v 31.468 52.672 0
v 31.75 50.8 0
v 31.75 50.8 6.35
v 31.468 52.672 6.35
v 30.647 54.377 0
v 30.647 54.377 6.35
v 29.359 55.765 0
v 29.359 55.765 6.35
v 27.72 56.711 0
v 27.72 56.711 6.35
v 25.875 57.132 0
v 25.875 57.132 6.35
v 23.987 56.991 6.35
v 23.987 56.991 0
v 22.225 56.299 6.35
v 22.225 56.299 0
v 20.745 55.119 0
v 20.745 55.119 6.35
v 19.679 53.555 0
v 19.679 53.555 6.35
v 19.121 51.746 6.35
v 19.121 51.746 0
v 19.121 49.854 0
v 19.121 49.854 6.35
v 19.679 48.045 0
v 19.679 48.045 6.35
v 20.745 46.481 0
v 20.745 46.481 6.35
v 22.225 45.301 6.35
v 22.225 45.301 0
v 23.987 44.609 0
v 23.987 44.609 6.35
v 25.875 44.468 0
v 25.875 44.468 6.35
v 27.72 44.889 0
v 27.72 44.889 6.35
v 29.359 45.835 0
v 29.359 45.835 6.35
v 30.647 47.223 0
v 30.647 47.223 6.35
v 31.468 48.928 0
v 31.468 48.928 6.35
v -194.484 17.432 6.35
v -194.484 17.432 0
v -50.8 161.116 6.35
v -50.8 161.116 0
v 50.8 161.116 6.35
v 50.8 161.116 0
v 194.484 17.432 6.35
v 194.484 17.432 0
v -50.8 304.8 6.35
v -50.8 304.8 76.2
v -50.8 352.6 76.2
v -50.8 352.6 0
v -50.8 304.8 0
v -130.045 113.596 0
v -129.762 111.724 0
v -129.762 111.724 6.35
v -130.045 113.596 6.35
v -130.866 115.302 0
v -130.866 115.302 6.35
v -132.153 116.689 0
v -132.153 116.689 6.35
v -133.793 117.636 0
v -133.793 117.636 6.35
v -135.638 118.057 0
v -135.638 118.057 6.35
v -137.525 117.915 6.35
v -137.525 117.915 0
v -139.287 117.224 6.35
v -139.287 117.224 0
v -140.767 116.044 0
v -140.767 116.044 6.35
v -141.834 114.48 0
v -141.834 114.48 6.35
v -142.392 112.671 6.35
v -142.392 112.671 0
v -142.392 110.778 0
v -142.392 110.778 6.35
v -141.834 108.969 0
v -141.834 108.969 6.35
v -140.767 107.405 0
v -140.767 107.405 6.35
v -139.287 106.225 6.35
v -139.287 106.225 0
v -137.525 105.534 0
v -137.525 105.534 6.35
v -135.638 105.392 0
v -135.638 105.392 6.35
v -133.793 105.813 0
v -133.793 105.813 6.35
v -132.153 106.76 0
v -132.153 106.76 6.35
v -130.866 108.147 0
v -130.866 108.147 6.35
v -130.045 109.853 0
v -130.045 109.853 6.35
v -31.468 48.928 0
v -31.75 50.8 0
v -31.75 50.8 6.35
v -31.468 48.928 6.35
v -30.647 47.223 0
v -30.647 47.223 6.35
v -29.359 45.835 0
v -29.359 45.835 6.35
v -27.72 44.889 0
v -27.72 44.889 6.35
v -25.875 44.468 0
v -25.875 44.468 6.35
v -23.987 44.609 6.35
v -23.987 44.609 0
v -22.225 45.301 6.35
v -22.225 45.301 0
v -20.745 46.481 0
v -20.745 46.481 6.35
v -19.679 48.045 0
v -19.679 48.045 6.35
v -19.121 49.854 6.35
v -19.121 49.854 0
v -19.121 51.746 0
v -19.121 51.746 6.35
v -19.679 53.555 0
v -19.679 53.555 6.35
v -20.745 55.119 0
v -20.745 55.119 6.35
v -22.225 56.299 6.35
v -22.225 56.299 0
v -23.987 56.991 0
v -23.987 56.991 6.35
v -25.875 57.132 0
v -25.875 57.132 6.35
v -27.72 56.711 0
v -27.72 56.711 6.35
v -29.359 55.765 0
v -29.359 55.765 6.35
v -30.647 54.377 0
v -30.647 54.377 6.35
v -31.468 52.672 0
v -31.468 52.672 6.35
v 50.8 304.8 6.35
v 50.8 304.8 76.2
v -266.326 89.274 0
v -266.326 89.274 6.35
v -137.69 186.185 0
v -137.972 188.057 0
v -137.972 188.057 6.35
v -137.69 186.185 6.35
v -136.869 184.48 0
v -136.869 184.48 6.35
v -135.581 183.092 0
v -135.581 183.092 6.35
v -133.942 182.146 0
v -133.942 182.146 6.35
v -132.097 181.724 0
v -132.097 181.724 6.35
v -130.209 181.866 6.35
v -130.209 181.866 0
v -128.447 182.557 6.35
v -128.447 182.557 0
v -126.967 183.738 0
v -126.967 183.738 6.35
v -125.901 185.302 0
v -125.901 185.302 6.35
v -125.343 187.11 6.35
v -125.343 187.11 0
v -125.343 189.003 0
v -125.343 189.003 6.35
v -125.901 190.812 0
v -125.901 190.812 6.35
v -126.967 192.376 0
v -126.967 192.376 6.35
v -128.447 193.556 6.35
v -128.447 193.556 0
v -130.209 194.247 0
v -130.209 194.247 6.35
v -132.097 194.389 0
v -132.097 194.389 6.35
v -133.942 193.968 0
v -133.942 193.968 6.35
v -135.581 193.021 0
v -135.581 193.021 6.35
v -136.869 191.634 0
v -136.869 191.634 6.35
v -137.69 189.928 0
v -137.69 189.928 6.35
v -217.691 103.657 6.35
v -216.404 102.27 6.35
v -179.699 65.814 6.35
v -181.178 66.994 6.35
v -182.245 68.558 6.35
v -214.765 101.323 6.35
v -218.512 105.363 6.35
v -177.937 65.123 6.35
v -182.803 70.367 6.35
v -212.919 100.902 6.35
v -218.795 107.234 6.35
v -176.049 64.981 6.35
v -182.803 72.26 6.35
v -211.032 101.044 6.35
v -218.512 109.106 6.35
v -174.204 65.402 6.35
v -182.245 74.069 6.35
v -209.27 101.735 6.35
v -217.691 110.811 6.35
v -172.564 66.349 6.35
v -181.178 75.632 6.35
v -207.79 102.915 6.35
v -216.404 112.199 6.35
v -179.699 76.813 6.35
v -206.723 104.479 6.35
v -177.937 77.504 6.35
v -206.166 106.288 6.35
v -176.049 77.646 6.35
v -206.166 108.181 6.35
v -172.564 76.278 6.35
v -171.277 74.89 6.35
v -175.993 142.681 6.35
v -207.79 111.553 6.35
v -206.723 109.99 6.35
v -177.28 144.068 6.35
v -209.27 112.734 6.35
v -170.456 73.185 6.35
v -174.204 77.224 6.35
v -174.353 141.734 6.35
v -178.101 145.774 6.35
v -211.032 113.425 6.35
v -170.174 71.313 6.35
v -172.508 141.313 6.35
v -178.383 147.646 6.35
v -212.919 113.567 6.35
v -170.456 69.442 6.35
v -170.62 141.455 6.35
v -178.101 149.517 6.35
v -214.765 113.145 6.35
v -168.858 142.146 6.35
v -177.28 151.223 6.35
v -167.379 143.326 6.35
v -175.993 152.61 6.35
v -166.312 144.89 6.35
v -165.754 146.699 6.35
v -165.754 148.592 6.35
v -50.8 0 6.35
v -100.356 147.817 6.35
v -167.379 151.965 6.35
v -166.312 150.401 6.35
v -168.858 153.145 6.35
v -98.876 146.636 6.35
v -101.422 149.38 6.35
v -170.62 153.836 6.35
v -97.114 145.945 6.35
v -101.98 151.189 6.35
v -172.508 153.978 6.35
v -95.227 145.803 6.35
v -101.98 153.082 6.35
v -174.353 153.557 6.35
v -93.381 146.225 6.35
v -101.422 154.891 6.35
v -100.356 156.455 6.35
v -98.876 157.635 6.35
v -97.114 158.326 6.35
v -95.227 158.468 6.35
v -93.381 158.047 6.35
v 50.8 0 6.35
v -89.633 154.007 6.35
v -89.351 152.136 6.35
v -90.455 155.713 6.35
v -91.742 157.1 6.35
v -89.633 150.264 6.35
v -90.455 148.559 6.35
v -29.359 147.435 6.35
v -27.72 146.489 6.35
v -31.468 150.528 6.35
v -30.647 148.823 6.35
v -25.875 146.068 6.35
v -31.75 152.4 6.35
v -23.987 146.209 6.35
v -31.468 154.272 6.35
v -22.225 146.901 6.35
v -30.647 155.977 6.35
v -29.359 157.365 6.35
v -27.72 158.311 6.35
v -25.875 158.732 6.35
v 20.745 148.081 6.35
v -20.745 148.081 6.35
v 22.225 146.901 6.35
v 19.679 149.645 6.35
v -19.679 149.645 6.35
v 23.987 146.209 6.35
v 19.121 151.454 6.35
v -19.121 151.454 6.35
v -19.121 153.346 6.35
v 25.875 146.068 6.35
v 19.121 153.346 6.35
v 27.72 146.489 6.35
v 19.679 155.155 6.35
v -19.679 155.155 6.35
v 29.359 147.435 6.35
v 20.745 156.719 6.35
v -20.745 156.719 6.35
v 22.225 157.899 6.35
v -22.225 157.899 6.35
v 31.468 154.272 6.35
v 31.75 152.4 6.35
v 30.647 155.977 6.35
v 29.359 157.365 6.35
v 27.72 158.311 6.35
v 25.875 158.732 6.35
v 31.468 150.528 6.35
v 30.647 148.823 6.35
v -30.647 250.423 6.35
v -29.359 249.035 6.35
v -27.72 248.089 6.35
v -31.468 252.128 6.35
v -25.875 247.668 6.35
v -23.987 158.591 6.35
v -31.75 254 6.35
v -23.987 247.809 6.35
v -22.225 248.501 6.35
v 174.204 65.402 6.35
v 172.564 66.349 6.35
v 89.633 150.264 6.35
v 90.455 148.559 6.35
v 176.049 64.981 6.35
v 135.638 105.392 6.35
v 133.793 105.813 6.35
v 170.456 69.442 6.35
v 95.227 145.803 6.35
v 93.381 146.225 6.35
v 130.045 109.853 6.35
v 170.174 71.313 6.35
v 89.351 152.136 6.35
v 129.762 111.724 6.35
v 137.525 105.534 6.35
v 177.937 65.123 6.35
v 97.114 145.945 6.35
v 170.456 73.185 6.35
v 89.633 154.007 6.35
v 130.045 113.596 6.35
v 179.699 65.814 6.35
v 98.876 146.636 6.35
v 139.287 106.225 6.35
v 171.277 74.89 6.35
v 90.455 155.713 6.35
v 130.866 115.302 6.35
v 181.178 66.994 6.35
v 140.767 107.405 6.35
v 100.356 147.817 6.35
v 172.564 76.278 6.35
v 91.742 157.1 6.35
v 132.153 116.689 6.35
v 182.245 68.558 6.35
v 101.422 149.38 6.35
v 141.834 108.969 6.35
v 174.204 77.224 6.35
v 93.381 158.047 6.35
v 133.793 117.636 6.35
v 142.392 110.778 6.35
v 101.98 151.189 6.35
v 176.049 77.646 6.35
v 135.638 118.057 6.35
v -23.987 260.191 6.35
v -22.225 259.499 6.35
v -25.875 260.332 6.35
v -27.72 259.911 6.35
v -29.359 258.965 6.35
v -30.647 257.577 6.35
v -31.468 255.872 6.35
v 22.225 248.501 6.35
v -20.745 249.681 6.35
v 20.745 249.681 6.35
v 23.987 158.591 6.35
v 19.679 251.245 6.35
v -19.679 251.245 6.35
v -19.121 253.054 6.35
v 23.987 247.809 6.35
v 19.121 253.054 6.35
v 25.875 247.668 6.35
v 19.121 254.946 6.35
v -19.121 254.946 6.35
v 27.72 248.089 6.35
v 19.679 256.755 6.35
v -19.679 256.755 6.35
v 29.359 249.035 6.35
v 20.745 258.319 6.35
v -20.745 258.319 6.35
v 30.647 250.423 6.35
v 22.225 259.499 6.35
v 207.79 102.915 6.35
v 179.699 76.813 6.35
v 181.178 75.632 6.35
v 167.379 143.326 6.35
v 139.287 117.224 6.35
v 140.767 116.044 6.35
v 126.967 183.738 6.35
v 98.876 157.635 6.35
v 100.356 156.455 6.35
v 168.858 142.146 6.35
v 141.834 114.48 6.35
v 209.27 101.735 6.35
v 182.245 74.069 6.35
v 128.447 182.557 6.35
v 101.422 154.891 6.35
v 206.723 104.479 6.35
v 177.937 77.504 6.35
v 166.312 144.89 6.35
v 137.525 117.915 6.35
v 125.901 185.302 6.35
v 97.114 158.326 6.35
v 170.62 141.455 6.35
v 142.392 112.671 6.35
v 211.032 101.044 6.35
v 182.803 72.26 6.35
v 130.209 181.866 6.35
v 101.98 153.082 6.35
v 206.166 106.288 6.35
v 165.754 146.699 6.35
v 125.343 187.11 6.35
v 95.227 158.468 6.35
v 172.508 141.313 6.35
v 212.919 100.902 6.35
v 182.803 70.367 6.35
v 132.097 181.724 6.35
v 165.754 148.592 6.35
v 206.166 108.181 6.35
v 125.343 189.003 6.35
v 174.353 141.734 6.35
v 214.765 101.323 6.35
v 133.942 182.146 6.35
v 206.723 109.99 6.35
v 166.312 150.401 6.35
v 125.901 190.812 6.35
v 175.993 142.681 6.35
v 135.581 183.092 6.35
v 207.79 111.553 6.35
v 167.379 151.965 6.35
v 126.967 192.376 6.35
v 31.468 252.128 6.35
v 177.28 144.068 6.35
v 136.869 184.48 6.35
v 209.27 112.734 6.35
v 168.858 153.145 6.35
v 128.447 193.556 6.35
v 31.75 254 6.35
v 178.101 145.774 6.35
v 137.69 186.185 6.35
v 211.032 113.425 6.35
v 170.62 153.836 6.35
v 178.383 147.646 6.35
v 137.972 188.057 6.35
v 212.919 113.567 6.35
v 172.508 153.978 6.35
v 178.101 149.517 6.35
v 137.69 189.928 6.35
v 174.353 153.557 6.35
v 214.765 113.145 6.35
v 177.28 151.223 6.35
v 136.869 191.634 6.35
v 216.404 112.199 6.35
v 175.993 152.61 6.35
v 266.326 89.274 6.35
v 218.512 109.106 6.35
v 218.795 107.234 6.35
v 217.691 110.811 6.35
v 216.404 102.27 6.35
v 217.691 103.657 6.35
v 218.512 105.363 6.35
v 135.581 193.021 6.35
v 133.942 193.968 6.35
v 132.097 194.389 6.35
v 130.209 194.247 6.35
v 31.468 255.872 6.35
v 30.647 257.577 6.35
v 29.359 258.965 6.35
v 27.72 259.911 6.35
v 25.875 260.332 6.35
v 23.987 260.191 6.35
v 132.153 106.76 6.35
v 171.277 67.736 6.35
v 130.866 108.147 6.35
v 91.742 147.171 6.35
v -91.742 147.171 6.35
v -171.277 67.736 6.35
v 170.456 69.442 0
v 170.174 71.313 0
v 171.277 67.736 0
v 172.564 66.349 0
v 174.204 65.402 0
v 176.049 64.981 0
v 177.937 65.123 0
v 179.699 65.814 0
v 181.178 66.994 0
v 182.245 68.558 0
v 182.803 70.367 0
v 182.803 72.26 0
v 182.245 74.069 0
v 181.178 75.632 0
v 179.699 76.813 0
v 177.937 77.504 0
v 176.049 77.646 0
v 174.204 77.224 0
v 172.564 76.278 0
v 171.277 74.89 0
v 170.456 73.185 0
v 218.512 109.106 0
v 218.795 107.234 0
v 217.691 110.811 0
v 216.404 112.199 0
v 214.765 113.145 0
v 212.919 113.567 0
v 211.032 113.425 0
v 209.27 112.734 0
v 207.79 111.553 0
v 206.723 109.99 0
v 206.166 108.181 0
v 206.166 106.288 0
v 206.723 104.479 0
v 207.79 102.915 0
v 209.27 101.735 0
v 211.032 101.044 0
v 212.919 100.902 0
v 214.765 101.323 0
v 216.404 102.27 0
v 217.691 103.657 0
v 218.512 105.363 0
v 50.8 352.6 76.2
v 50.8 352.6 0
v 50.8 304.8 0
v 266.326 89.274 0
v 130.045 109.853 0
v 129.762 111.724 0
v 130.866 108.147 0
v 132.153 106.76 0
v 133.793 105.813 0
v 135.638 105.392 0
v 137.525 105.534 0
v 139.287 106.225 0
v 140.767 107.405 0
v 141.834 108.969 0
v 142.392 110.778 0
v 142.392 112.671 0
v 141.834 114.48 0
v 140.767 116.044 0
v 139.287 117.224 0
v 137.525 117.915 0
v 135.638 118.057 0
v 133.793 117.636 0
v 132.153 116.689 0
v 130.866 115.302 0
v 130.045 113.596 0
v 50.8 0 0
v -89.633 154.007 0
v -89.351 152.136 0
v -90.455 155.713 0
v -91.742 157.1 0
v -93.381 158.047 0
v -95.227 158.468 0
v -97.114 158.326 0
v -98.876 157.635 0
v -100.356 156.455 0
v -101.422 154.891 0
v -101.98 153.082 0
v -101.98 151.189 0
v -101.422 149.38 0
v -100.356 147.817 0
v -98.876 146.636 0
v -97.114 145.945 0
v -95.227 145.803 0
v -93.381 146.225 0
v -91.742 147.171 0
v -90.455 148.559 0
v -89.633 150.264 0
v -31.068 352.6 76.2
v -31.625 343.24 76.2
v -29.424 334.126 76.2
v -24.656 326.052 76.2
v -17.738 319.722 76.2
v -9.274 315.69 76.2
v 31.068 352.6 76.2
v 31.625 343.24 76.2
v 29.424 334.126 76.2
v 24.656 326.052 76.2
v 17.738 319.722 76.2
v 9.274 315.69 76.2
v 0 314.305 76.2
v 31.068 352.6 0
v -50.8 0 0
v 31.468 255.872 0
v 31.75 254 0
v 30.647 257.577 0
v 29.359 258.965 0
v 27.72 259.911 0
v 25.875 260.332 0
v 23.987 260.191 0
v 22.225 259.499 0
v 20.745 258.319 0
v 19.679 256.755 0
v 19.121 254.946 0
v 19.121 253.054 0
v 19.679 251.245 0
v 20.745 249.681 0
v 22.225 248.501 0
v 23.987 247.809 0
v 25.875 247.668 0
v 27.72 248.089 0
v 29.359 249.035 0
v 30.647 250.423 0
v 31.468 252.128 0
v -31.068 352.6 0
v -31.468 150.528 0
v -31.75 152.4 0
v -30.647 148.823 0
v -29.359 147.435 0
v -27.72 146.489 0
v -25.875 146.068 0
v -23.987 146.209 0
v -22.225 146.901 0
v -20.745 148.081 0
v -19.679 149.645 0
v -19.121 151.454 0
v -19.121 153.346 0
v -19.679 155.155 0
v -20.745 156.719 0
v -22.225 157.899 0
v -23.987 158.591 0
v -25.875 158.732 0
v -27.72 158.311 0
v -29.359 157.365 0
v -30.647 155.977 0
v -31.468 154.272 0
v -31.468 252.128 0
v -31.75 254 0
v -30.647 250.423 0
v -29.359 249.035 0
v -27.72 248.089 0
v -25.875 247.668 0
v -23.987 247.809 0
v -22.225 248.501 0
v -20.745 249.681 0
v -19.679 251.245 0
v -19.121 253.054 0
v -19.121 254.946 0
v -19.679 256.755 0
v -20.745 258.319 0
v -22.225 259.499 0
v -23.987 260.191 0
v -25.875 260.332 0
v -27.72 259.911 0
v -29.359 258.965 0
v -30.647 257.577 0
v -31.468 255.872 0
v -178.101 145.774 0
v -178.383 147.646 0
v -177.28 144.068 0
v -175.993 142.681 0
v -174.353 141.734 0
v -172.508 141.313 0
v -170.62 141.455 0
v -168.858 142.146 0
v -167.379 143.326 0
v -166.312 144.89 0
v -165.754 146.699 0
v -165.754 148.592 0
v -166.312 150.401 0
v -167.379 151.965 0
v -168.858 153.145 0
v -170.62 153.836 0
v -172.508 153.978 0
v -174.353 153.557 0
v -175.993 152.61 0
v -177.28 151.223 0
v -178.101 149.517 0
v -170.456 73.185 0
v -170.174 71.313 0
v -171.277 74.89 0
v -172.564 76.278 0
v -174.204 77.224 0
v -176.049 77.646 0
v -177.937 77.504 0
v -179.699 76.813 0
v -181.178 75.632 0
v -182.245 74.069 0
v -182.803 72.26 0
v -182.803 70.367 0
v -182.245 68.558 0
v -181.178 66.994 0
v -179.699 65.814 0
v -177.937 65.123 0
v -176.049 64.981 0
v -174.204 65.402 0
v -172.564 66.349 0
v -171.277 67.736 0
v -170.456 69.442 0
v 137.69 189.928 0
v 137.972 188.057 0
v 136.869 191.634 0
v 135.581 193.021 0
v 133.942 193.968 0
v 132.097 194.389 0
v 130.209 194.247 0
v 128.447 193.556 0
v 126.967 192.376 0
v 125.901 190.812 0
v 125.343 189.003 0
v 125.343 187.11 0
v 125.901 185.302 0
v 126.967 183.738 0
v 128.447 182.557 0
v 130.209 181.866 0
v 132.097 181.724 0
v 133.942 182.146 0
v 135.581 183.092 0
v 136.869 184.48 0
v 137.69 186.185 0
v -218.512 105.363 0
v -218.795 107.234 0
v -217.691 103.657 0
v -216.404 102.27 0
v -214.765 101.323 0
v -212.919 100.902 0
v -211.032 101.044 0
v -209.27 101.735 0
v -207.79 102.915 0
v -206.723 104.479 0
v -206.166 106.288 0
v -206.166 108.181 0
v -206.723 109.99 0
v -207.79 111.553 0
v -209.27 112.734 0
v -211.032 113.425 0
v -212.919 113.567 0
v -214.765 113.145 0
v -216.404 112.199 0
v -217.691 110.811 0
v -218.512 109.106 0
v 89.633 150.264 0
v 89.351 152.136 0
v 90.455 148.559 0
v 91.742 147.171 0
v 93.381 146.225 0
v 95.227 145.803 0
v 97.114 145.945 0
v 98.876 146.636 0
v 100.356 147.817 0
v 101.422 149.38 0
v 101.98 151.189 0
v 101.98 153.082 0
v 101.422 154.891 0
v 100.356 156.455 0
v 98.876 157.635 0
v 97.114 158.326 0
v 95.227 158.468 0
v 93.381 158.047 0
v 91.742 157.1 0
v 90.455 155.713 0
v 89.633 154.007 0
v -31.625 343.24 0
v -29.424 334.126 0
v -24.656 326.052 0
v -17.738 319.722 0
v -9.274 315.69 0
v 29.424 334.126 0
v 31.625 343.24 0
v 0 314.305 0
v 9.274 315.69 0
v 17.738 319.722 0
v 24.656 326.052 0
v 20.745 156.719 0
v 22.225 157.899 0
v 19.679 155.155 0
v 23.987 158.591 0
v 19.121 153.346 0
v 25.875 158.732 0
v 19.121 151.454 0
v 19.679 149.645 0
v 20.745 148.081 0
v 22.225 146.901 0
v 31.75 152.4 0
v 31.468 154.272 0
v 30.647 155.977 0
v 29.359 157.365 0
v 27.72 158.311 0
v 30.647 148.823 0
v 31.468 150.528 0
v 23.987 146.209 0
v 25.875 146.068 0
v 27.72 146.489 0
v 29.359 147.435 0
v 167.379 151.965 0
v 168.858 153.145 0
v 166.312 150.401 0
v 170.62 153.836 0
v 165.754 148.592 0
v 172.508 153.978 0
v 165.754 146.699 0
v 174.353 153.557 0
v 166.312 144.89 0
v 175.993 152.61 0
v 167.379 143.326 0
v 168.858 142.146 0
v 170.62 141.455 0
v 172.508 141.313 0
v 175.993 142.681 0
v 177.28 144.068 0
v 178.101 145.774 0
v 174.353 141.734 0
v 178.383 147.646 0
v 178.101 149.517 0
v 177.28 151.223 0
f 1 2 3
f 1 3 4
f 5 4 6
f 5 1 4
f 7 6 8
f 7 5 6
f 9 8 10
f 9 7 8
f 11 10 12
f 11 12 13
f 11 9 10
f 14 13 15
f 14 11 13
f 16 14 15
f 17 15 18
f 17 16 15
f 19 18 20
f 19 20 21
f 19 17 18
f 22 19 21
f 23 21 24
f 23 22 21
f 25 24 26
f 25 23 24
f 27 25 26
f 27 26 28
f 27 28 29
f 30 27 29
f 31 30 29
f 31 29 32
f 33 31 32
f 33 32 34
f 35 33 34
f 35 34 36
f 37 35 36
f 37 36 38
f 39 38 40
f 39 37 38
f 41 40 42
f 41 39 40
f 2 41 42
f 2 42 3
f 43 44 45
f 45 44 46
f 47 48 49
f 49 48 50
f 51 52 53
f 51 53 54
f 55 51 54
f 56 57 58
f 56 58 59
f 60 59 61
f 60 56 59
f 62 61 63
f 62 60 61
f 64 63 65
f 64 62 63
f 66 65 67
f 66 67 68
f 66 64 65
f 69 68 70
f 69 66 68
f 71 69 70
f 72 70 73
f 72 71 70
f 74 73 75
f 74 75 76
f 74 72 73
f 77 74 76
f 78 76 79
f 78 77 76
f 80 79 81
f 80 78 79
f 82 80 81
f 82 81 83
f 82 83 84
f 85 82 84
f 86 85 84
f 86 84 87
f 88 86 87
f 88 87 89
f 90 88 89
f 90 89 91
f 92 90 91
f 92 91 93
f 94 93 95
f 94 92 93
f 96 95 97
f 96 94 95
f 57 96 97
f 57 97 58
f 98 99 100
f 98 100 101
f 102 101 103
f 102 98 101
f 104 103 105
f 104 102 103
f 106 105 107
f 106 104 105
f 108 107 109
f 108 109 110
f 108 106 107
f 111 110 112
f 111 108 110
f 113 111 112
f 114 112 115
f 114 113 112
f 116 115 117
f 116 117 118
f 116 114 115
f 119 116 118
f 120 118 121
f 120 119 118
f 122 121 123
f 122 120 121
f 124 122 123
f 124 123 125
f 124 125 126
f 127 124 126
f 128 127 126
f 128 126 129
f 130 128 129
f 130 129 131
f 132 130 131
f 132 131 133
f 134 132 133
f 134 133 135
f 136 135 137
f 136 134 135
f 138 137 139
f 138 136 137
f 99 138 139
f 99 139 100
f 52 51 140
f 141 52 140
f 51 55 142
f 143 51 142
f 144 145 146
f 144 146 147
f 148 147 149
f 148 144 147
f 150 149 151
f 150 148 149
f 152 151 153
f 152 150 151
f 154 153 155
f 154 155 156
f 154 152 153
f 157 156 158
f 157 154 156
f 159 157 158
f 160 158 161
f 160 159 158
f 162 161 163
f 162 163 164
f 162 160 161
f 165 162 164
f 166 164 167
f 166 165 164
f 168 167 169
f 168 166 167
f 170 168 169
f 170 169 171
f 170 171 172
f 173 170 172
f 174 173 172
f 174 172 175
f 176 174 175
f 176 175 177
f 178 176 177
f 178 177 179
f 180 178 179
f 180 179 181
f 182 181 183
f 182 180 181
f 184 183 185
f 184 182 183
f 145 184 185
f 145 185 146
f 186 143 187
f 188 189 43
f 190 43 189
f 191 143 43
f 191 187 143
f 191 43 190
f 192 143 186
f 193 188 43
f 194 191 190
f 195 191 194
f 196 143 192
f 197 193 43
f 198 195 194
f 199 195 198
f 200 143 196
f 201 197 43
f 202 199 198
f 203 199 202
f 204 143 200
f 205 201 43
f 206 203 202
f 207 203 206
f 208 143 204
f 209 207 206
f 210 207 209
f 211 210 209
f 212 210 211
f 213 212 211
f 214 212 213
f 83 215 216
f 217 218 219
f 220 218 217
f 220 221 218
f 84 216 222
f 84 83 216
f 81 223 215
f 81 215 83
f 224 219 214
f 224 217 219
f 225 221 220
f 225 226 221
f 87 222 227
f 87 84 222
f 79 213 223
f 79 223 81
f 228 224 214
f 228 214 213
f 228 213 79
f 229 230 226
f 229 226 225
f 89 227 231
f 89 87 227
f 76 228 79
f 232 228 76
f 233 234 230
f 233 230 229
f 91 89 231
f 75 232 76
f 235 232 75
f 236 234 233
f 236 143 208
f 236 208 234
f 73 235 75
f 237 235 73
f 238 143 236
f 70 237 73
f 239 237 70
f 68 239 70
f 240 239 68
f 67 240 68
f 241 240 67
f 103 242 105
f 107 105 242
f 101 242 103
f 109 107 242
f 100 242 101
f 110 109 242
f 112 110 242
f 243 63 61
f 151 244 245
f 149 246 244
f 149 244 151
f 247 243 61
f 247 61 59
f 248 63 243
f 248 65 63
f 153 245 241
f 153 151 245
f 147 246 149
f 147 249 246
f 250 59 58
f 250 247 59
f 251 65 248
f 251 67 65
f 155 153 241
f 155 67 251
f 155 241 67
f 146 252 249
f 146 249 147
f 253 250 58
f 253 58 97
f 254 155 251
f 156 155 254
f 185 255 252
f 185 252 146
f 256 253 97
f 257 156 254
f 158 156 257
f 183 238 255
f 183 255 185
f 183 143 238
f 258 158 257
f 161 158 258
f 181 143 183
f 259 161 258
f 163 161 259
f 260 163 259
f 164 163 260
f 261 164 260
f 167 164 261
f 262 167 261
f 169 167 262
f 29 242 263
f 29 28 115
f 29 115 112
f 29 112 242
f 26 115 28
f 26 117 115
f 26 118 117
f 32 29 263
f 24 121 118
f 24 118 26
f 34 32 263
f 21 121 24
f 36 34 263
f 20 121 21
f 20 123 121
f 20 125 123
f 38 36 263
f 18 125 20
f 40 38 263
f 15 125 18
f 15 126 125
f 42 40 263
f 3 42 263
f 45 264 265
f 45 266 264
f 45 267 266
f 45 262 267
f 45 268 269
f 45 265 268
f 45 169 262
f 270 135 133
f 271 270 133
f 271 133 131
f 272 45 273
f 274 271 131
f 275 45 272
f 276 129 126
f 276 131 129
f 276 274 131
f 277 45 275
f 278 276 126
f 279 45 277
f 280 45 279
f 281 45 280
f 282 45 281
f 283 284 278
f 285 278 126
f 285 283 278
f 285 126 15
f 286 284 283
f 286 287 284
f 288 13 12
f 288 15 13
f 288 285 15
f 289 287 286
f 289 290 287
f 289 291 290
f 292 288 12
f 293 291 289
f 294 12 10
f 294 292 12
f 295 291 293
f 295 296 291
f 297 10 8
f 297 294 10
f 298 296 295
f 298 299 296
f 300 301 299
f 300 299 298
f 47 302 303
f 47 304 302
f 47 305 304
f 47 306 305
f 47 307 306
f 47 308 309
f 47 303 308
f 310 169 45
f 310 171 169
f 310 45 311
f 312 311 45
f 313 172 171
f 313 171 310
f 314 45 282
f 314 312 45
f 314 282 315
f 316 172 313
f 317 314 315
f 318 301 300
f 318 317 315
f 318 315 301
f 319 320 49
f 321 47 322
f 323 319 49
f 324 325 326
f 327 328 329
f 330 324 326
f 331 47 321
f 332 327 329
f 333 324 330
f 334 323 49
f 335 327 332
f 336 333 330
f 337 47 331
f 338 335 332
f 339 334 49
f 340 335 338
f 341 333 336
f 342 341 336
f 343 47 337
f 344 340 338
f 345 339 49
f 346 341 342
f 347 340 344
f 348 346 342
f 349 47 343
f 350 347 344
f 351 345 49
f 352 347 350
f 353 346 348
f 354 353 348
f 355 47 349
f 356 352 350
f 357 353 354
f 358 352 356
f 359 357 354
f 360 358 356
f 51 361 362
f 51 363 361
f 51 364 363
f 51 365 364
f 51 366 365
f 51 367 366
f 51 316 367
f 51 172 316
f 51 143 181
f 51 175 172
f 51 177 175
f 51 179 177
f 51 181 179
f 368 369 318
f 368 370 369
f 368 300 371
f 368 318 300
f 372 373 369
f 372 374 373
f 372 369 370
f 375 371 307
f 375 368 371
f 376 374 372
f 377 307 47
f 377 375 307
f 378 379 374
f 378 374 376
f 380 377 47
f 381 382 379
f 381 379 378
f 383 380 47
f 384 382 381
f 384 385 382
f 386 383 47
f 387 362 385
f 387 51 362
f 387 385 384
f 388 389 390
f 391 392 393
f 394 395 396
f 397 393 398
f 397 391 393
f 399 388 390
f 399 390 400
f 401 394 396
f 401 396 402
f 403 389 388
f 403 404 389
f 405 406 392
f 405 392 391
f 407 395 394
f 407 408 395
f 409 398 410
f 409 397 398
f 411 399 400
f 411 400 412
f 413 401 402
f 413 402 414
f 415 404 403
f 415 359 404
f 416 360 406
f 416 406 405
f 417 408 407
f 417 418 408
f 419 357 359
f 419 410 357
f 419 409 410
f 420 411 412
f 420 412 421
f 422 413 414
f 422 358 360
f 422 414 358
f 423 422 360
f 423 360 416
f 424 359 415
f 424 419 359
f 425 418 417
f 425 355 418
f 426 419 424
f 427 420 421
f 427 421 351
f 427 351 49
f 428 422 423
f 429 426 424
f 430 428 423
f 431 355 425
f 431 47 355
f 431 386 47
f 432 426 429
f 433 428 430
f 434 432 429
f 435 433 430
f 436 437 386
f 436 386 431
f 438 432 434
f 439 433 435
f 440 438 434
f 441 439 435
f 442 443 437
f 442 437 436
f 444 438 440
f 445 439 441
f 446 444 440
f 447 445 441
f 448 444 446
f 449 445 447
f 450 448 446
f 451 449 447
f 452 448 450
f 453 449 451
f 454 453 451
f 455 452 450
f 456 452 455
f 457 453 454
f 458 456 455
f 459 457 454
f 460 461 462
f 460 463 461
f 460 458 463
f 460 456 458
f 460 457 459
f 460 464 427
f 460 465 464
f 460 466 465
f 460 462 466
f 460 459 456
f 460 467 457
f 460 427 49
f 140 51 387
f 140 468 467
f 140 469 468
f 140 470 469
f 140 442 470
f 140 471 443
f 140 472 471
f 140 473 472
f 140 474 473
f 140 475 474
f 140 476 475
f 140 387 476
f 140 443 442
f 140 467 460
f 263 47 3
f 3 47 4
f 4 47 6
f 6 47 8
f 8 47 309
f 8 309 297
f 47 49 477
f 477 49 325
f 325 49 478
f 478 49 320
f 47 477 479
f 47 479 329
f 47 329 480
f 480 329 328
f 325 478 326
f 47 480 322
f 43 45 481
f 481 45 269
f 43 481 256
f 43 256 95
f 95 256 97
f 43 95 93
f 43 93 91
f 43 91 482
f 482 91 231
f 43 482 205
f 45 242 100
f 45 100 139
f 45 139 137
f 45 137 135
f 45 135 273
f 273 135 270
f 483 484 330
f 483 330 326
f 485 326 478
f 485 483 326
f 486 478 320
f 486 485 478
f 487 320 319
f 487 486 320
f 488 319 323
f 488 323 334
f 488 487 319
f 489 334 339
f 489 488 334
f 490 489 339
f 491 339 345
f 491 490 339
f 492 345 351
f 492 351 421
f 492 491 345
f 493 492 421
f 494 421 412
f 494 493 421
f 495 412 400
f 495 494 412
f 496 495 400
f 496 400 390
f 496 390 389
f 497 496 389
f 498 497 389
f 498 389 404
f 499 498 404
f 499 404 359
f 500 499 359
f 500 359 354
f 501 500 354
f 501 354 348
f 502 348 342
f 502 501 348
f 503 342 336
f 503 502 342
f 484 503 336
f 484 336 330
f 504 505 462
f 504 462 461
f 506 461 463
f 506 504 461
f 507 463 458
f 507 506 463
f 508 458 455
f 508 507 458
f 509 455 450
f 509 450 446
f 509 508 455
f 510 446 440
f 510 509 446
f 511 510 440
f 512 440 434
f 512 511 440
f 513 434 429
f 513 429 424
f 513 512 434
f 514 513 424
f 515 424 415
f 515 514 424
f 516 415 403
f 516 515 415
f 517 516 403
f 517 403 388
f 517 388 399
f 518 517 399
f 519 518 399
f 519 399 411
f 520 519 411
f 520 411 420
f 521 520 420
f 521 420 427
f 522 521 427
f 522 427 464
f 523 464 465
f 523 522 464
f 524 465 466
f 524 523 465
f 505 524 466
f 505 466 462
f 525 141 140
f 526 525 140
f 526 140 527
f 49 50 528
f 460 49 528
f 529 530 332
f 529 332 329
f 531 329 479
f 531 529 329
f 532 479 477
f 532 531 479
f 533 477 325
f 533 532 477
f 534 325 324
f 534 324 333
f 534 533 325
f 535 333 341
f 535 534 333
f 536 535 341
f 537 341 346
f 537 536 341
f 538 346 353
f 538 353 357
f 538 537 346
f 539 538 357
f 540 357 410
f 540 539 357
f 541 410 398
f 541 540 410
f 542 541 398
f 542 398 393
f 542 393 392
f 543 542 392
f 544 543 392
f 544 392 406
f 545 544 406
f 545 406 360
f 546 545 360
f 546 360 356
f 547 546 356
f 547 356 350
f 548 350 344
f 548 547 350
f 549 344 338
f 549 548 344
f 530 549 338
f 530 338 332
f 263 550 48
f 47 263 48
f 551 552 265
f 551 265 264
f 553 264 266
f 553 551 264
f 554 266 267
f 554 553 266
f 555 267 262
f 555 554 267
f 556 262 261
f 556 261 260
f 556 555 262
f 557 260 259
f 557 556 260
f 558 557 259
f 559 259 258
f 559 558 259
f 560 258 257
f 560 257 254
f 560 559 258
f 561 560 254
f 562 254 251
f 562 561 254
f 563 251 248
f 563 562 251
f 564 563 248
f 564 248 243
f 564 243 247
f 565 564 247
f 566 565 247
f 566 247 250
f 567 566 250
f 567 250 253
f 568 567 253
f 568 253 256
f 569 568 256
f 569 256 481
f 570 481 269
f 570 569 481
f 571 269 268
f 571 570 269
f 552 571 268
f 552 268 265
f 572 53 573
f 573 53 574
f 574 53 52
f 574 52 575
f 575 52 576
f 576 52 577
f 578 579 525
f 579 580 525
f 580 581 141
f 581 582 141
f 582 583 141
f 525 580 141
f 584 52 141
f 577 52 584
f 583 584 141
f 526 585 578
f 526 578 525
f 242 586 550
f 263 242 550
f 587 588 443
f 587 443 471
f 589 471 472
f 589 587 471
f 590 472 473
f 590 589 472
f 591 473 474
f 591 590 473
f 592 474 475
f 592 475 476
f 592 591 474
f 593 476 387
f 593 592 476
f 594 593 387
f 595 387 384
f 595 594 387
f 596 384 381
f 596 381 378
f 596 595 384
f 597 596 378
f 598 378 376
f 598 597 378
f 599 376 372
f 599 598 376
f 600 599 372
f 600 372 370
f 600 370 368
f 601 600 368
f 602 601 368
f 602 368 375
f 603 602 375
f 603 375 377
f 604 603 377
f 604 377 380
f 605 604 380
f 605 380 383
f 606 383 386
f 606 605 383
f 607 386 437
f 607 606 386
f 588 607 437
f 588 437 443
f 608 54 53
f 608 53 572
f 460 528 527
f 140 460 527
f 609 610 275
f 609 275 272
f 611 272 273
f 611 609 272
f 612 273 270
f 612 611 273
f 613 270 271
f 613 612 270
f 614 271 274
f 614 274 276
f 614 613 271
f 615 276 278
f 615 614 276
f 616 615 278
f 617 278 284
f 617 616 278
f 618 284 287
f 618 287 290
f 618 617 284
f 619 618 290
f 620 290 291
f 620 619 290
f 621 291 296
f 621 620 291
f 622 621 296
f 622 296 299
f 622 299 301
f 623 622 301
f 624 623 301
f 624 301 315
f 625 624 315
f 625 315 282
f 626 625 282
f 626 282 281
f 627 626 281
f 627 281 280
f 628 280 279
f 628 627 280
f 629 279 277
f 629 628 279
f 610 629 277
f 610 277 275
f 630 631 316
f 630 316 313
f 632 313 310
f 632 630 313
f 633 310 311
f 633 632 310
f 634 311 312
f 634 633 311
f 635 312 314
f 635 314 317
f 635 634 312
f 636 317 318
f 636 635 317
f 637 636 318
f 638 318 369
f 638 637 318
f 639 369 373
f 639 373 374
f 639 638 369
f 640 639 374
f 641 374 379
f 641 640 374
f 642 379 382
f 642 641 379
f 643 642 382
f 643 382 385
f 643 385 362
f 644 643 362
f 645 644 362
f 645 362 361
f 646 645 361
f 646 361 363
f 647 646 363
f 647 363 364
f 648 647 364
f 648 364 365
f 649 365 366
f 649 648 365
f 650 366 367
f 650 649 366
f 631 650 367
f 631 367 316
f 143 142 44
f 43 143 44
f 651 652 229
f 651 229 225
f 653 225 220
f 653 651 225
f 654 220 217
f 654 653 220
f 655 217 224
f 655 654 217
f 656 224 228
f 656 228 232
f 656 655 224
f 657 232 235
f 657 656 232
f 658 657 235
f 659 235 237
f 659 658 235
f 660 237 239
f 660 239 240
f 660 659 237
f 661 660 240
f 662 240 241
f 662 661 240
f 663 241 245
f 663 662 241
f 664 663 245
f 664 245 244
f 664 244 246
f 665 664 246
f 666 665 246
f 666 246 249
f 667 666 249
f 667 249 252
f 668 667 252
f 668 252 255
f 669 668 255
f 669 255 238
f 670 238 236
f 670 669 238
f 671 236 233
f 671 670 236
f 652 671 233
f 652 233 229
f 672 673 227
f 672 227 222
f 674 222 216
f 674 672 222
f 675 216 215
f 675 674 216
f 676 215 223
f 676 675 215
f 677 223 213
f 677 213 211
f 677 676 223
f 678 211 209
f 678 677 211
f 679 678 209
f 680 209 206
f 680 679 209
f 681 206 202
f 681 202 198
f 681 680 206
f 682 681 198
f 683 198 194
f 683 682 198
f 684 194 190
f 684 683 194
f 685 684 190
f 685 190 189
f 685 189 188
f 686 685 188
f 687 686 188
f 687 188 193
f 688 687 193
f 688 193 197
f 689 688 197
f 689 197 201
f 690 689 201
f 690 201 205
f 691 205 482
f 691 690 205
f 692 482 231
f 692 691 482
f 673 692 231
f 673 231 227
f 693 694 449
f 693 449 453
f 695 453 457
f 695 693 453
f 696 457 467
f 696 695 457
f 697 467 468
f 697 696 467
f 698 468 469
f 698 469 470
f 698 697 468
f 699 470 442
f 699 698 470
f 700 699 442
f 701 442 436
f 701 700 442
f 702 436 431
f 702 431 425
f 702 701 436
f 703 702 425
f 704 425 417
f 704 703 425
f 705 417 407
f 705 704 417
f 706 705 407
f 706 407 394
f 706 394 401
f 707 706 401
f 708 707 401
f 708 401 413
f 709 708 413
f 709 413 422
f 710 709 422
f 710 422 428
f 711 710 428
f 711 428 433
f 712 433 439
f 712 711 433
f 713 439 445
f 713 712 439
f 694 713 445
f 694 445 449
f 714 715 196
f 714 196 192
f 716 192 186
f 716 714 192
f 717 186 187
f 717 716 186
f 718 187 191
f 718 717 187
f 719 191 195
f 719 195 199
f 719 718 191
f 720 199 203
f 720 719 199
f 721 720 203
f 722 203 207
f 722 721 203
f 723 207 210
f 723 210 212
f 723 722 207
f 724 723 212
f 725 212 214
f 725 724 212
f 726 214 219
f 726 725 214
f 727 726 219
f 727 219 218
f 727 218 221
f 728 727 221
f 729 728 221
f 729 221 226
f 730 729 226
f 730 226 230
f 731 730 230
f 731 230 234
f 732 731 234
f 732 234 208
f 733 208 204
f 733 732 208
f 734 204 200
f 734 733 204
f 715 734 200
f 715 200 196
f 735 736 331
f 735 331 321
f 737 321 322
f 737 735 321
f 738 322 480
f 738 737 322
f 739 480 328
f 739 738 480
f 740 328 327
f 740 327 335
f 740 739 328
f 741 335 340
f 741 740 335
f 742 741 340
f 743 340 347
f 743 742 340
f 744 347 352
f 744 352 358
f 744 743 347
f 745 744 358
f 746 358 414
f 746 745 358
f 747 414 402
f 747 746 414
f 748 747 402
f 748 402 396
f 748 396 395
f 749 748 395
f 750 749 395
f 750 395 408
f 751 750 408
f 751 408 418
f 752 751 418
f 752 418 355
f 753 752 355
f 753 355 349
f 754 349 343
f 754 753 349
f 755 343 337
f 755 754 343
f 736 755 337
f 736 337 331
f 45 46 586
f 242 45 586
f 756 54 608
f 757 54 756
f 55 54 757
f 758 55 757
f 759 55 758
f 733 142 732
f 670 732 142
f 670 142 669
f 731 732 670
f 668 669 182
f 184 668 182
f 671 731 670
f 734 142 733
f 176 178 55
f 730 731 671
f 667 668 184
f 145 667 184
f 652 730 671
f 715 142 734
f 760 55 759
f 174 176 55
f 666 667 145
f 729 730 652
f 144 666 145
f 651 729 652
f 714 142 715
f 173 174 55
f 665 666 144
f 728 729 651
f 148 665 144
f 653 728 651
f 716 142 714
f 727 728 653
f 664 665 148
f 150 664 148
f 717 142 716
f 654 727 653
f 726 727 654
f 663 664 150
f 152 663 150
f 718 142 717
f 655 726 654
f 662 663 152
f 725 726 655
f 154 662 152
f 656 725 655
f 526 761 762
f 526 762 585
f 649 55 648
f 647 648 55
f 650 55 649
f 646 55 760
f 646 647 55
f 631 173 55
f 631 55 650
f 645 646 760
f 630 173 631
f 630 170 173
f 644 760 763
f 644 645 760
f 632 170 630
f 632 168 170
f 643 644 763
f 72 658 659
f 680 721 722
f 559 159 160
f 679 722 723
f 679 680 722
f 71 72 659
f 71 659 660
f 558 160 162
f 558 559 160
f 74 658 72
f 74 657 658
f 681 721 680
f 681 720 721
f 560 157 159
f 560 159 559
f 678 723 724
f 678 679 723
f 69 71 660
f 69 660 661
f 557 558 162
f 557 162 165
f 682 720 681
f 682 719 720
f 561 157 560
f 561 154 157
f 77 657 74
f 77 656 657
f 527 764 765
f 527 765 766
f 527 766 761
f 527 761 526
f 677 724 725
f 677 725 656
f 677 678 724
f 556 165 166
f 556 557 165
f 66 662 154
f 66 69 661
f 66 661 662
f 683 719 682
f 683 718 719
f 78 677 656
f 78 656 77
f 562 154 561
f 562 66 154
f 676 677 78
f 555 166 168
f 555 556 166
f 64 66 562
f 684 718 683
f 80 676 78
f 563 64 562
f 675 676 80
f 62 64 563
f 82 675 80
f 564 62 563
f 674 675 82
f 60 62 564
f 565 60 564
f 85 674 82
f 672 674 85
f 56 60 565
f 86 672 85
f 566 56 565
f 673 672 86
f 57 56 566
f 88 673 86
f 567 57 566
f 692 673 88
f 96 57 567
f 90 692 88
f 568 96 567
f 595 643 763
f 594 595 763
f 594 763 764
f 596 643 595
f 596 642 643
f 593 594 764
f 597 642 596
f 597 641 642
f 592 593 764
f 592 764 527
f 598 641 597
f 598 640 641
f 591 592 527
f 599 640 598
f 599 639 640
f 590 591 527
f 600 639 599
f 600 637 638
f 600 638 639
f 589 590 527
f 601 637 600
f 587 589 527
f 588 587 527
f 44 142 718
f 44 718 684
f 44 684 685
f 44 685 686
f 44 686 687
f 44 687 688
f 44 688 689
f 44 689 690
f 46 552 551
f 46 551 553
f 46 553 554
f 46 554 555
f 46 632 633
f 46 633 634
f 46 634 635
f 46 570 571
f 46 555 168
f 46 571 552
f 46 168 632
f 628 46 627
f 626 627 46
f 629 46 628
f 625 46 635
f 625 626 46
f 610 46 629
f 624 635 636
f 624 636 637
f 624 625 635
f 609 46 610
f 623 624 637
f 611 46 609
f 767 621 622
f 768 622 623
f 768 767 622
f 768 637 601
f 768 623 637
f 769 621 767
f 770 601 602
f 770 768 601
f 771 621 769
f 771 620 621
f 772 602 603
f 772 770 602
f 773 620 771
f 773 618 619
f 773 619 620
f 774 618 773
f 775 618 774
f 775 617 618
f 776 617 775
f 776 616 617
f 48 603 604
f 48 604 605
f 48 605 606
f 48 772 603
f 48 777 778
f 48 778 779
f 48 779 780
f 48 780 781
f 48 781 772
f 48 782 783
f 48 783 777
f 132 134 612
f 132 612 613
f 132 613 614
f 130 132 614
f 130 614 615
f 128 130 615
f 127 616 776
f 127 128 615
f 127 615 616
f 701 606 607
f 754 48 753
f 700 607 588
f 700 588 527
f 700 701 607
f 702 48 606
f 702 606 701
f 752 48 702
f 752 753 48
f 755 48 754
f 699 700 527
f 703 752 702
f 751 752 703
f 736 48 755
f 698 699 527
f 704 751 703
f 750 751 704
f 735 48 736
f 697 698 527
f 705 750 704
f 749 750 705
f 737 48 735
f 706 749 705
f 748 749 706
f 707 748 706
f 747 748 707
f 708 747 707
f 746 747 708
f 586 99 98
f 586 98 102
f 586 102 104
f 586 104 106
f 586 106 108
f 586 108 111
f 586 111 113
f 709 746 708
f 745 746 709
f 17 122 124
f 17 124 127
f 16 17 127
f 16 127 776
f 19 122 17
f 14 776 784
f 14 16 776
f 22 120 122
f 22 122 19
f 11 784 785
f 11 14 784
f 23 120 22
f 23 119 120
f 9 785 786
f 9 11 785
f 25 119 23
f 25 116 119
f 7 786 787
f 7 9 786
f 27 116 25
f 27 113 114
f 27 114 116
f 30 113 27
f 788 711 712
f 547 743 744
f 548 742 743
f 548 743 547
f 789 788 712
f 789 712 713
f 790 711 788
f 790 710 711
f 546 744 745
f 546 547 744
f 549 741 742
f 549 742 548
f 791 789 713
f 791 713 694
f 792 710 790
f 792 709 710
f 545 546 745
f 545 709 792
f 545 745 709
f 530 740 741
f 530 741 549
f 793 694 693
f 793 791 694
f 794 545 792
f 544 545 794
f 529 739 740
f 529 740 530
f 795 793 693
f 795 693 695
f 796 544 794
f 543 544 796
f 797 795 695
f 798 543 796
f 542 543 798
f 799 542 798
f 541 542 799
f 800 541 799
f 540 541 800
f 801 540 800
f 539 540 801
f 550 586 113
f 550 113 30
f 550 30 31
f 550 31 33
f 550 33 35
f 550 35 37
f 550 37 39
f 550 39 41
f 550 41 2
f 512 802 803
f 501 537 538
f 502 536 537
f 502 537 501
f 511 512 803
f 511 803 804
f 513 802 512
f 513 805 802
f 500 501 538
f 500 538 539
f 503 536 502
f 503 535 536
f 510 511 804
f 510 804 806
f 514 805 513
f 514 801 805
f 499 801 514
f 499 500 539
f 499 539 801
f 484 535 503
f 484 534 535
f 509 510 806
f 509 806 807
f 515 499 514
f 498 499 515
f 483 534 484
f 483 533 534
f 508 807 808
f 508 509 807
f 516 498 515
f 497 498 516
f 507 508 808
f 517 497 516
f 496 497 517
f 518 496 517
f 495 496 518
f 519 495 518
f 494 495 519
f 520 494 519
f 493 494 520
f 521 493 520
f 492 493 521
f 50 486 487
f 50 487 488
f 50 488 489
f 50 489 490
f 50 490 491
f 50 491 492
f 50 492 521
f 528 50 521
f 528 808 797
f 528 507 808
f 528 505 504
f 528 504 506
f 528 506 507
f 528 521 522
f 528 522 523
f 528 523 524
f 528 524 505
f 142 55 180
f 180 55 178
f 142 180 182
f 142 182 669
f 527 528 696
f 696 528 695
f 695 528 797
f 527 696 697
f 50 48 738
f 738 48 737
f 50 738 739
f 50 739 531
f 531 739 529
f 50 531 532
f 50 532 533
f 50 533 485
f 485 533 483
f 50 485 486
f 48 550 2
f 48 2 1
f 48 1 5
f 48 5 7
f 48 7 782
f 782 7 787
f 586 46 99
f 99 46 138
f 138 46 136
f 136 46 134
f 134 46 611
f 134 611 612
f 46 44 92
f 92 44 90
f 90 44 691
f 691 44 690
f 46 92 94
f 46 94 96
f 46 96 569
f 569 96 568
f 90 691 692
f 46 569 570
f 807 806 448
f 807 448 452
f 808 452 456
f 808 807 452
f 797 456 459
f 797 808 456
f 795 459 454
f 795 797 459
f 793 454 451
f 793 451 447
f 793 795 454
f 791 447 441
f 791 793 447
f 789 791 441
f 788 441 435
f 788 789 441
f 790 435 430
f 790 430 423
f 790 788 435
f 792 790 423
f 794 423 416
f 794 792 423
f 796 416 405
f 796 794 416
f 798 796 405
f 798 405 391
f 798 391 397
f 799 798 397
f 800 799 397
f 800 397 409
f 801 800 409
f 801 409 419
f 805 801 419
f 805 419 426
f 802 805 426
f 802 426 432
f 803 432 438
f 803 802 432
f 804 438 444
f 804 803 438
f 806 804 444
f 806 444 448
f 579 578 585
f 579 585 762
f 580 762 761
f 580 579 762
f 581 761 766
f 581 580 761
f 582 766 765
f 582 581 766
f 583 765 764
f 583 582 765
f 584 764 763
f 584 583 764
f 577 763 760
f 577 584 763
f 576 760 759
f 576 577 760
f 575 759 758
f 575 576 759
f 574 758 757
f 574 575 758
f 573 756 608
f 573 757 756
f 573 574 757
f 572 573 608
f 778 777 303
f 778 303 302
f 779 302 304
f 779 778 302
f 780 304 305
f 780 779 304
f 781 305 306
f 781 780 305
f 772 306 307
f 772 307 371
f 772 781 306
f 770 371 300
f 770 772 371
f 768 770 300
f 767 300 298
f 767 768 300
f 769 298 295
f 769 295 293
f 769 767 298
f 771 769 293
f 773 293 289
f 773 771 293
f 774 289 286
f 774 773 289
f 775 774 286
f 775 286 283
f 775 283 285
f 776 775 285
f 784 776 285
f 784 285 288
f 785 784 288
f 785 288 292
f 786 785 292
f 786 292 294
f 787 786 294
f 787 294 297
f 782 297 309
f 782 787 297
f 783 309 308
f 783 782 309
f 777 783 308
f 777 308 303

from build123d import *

# Parameters (mm, degrees)
SKETCH2_R           = 6.35
BOSS_EXTRUDE1_DEPTH = 6.35
SKETCH3_W           = 101.6
SKETCH3_H           = 76.2
BOSS_EXTRUDE3_DEPTH = 47.8
CUT_EXTRUDE1_DEPTH  = 449.400286045


with BuildPart() as part:
    # Sketch2 → Boss-Extrude1 (new body)
    with BuildSketch(Plane.XY):
        Polygon((-50.8, 0), (50.8, 0), (50.8, 161.115902063), (194.484097937, 17.431804126), (266.326146906, 89.273853094), (50.8, 304.8), (-50.8, 304.8), (-266.326146906, 89.273853094), (-194.484097937, 17.431804126), (-50.8, 161.115902063), align=None)
        with Locations((212.444610179, 107.234365336)):
            Circle(SKETCH2_R, mode=Mode.SUBTRACT)
        with Locations((172.033457634, 147.645517881)):
            Circle(SKETCH2_R, mode=Mode.SUBTRACT)
        with Locations((131.62230509, 188.056670426)):
            Circle(SKETCH2_R, mode=Mode.SUBTRACT)
        with Locations(Location((136.11243315, 111.724493397, 0), (0, 0, 180))):
            Circle(SKETCH2_R, mode=Mode.SUBTRACT)
        with Locations(Location((95.701280605, 152.135645942, 0), (0, 0, 180))):
            Circle(SKETCH2_R, mode=Mode.SUBTRACT)
        with Locations(Location((176.523585695, 71.313340852, 0), (0, 0, 180))):
            Circle(SKETCH2_R, mode=Mode.SUBTRACT)
        with Locations((25.4, 50.8)):
            Circle(SKETCH2_R, mode=Mode.SUBTRACT)
        with Locations((25.4, 152.4)):
            Circle(SKETCH2_R, mode=Mode.SUBTRACT)
        with Locations((25.4, 254)):
            Circle(SKETCH2_R, mode=Mode.SUBTRACT)
        with Locations(Location((-25.4, 254, 0), (0, 0, 180))):
            Circle(SKETCH2_R, mode=Mode.SUBTRACT)
        with Locations(Location((-25.4, 152.4, 0), (0, 0, 180))):
            Circle(SKETCH2_R, mode=Mode.SUBTRACT)
        with Locations(Location((-25.4, 50.8, 0), (0, 0, 180))):
            Circle(SKETCH2_R, mode=Mode.SUBTRACT)
        with Locations((-176.523585695, 71.313340852)):
            Circle(SKETCH2_R, mode=Mode.SUBTRACT)
        with Locations((-95.701280605, 152.135645942)):
            Circle(SKETCH2_R, mode=Mode.SUBTRACT)
        with Locations((-136.11243315, 111.724493397)):
            Circle(SKETCH2_R, mode=Mode.SUBTRACT)
        with Locations(Location((-131.62230509, 188.056670426, 0), (0, 0, 180))):
            Circle(SKETCH2_R, mode=Mode.SUBTRACT)
        with Locations(Location((-172.033457634, 147.645517881, 0), (0, 0, 180))):
            Circle(SKETCH2_R, mode=Mode.SUBTRACT)
        with Locations(Location((-212.444610179, 107.234365336, 0), (0, 0, 180))):
            Circle(SKETCH2_R, mode=Mode.SUBTRACT)
    extrude(amount=BOSS_EXTRUDE1_DEPTH)

    # Sketch3 → Boss-Extrude3 (add)
    with BuildSketch(Plane(origin=(0, 304.8, 0), x_dir=(1, 0, 0), z_dir=(0, 1, 0))):
        with Locations((0, -38.1)):
            Rectangle(SKETCH3_W, SKETCH3_H)
    extrude(amount=BOSS_EXTRUDE3_DEPTH)

    # Sketch4 → Cut-Extrude1 (cut, through all)
    with BuildSketch(Plane.XY.offset(76.2)):
        with BuildLine():
            Line((-31.068100257, 352.6), (31.068100257, 352.6))
            ThreePointArc((31.068100257, 352.6), (0, 314.305105316), (-31.068100257, 352.6))
        make_face()
    extrude(amount=-CUT_EXTRUDE1_DEPTH, mode=Mode.SUBTRACT)


solid = part.part
